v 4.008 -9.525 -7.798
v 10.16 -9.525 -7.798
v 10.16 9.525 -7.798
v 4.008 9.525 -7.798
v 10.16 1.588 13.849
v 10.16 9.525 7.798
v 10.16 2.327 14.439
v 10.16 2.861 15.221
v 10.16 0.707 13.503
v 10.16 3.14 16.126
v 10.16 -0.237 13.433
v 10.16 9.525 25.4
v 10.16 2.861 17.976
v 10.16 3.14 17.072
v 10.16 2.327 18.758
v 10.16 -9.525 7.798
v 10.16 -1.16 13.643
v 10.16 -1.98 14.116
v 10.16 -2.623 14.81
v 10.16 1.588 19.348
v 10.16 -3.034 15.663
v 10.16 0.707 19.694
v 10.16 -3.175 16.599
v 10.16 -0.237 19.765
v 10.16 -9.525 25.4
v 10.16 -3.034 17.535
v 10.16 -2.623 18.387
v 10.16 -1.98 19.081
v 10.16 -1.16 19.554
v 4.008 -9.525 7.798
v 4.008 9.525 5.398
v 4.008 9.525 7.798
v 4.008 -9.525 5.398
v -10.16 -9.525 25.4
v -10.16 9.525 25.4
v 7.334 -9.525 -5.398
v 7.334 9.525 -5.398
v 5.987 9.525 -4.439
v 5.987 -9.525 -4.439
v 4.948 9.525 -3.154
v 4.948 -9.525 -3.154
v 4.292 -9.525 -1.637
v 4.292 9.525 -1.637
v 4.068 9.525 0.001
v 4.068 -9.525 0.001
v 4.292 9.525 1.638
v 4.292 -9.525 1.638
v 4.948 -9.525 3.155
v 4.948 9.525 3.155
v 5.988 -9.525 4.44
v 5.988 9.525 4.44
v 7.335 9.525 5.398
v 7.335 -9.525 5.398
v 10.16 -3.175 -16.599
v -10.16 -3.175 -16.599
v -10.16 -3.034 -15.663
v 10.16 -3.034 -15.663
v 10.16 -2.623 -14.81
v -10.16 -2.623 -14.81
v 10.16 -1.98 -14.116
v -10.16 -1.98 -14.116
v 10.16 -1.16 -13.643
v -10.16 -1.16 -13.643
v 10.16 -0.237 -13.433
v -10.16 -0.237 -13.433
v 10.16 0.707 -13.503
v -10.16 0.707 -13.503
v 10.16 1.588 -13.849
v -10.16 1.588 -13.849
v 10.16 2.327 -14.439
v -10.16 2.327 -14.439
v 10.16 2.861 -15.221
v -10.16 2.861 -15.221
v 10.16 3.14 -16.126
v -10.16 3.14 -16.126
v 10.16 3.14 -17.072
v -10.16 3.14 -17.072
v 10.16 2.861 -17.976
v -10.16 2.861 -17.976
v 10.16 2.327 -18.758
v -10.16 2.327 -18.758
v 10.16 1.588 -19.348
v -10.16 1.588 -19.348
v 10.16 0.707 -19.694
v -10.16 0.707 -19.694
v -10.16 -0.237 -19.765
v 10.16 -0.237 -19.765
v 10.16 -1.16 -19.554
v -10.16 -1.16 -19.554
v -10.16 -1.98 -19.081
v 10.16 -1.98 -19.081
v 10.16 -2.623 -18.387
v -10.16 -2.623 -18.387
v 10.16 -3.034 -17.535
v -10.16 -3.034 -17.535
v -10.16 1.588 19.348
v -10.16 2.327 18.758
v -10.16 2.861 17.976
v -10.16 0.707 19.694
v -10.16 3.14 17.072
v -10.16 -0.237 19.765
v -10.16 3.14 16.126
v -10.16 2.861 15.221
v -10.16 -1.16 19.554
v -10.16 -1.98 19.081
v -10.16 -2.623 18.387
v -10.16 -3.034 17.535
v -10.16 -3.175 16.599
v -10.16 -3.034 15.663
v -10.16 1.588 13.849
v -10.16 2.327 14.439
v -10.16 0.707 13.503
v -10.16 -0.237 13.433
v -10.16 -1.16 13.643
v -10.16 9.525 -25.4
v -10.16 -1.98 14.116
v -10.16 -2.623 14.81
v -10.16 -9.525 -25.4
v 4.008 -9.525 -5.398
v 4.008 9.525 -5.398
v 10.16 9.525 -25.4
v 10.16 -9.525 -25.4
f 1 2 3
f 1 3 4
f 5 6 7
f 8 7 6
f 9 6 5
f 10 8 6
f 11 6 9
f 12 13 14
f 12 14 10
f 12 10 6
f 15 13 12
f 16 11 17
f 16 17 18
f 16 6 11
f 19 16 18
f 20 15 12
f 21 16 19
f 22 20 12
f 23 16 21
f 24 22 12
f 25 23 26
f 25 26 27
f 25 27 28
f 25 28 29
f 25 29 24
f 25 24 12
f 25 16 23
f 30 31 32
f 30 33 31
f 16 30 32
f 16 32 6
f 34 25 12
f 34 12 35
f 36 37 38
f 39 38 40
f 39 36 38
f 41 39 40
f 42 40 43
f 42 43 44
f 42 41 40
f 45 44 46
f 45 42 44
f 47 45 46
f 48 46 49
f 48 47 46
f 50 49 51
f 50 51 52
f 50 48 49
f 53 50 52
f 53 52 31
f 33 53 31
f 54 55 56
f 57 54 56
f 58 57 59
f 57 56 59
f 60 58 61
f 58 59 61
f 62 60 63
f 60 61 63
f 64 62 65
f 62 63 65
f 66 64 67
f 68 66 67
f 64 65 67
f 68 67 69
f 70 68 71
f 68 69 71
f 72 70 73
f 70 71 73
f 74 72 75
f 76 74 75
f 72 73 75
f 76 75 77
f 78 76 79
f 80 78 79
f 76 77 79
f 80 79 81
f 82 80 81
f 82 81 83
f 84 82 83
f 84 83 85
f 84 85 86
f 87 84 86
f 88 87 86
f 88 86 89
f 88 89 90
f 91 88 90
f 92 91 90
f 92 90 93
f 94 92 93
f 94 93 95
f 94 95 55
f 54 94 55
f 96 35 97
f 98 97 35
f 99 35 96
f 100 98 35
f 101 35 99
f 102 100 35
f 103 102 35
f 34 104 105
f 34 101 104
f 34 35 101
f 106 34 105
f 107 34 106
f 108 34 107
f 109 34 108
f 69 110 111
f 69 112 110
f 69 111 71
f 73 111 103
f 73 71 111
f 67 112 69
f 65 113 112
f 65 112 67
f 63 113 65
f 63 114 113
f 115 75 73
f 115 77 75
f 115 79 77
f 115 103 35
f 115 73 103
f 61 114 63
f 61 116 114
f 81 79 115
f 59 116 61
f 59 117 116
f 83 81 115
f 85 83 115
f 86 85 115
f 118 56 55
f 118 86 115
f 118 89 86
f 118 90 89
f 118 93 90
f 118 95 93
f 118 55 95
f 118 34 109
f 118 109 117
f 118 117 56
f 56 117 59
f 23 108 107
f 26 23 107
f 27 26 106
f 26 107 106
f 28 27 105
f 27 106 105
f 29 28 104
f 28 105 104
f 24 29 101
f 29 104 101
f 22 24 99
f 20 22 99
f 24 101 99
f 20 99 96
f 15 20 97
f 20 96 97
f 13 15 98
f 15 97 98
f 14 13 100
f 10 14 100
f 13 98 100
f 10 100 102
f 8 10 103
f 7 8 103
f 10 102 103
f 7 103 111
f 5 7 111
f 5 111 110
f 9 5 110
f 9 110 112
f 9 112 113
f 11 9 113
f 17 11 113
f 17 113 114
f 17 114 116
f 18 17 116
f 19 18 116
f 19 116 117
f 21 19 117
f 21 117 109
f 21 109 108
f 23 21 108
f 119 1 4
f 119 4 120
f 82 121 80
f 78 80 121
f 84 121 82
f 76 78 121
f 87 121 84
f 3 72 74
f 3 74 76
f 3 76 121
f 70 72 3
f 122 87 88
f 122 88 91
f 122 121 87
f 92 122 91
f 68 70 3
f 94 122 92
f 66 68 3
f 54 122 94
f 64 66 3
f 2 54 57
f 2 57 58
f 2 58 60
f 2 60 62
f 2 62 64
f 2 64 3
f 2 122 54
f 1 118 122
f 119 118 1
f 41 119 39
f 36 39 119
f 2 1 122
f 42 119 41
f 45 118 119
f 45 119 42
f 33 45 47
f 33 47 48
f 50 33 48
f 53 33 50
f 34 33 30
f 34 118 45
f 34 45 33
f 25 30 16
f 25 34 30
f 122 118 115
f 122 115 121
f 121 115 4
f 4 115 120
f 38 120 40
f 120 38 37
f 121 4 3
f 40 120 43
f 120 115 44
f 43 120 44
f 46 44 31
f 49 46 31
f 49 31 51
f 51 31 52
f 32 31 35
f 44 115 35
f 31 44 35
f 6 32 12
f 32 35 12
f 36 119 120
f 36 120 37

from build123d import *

# Parameters (mm, degrees)
F1_DEPTH = 9.525
F2_R     = 3.175
F3_DEPTH = 25.4


with BuildPart() as f1:
    # F0 (on Front) → F1 (new body, symmetric)
    with BuildSketch(Plane.XZ):
        with BuildLine():
            Line((4.007829, 5.3975), (4.007829, 7.7975))
            Line((4.007829, 7.7975), (10.16, 7.7975))
            Line((10.16, 7.7975), (10.16, 25.4))
            Line((10.16, 25.4), (-10.16, 25.4))
            Line((-10.16, 25.4), (-10.16, -25.4))
            Line((-10.16, -25.4), (10.16, -25.4))
            Line((10.16, -25.4), (10.16, -7.7975))
            Line((10.16, -7.7975), (4.007829, -7.7975))
            Line((4.007829, -7.7975), (4.007829, -5.3975))
            Line((4.007829, -5.3975), (7.334133, -5.3975))
            ThreePointArc((7.334133, -5.3975), (4.067502, 0.000618), (7.335229, 5.398074))
            Line((7.335229, 5.398074), (4.007829, 5.3975))
        make_face()
    extrude(amount=F1_DEPTH, both=True)

    # F2 (on face) → F3 (cut)
    with BuildSketch(Plane(origin=(-10.16, 0, 0), x_dir=(0, -1, 0), z_dir=(-1, 0, 0))):
        with Locations((0, 16.59875)):
            Circle(F2_R)
        with Locations((0, -16.59875)):
            Circle(F2_R)
    extrude(amount=-F3_DEPTH, mode=Mode.SUBTRACT)


solid = f1.part
